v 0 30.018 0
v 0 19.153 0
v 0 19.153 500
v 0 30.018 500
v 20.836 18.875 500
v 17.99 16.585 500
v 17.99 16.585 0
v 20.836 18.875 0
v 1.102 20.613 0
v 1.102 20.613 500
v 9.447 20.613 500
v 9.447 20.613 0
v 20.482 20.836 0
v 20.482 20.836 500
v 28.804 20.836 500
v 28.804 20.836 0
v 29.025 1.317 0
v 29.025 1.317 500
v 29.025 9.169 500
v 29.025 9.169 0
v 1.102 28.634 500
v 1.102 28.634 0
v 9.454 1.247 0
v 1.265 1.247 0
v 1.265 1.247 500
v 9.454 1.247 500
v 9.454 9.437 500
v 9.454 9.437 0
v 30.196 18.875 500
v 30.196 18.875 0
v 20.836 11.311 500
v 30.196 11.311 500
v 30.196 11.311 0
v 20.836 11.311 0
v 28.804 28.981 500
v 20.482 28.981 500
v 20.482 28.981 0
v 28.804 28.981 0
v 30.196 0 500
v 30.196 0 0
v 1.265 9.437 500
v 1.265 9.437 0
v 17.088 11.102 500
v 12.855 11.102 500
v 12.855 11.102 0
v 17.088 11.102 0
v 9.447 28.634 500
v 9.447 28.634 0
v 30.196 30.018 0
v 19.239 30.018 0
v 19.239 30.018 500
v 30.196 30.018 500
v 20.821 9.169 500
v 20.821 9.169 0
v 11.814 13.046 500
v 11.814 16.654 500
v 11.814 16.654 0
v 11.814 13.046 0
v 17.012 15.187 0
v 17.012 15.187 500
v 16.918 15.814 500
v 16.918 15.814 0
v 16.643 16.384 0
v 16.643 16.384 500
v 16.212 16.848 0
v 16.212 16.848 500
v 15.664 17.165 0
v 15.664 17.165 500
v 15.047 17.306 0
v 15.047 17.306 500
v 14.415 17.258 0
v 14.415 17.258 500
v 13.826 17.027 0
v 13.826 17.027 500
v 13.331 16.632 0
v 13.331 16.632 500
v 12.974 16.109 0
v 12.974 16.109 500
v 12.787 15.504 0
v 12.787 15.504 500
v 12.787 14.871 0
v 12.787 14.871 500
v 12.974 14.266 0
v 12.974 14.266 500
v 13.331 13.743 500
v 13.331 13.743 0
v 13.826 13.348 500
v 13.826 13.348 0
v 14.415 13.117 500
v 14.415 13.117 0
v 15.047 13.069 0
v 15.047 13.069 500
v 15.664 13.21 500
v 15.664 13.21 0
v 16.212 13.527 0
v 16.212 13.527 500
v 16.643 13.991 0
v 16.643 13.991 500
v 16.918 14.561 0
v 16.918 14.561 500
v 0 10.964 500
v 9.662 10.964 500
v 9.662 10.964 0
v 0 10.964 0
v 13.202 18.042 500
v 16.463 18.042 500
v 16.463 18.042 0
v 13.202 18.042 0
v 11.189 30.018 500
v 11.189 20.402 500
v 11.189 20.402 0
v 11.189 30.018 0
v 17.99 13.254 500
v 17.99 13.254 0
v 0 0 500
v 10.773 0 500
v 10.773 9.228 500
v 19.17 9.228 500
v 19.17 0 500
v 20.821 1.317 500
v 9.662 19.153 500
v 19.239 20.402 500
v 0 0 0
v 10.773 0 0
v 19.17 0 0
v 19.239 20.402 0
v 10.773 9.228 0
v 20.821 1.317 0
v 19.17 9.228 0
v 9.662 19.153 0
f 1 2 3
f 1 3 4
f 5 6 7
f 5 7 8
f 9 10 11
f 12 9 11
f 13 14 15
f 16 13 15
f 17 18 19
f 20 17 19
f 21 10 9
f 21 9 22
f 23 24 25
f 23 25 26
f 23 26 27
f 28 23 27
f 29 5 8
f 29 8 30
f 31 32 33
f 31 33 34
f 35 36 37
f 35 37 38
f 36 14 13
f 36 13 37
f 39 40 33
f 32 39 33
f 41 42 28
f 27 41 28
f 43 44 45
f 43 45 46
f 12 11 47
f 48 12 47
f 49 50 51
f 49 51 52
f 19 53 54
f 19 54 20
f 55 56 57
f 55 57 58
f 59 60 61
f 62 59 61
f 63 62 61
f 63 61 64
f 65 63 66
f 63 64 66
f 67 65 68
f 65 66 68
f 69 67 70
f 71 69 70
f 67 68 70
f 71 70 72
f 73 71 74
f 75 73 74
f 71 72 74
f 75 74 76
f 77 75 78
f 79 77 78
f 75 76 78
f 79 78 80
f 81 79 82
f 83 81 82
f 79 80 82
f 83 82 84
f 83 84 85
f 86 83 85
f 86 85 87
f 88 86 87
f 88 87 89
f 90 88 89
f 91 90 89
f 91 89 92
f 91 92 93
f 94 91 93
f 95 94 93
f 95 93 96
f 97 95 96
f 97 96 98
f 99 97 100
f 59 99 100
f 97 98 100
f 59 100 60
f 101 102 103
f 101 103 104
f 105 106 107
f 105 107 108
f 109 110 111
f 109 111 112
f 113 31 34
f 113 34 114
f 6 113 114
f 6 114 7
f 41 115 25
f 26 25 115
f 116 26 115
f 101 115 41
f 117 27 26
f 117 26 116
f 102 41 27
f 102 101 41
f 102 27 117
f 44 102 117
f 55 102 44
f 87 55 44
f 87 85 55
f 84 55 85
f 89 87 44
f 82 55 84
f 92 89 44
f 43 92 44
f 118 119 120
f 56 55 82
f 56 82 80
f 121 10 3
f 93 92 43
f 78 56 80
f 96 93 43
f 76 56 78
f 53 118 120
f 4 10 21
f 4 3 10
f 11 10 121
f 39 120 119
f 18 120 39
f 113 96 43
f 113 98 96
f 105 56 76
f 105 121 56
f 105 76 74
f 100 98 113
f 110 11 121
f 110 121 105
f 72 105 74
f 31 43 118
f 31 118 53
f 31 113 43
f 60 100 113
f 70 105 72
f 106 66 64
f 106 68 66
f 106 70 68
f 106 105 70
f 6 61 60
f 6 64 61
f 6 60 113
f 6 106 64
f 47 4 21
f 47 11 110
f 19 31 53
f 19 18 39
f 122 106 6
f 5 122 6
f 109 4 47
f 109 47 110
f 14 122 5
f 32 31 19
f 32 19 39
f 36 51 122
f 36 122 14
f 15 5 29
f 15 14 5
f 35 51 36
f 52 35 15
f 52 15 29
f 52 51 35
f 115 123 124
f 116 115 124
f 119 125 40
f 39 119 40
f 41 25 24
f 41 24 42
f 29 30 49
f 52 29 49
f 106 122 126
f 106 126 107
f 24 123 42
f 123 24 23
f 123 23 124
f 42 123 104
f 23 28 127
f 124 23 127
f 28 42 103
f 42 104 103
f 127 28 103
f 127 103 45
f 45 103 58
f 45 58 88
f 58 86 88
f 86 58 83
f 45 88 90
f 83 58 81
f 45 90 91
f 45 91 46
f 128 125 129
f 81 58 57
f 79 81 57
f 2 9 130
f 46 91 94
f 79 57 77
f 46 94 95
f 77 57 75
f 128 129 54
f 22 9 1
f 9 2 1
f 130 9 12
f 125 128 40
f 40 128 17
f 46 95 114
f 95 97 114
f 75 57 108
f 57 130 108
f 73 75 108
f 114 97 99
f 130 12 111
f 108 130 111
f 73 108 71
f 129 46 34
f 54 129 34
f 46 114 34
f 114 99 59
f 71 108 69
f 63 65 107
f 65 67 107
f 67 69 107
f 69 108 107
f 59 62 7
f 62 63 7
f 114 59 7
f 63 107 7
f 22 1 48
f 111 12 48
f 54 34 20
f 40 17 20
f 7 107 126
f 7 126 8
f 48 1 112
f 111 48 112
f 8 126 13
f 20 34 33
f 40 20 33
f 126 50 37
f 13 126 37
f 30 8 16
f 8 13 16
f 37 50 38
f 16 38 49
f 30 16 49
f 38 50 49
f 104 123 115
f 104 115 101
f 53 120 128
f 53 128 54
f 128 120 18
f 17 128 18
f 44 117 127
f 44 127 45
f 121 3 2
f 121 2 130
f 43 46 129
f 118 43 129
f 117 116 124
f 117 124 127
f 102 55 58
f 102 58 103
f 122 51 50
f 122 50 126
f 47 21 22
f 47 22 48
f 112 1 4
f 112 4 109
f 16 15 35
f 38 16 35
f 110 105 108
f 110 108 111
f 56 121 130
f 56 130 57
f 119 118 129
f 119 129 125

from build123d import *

# Parameters (mm, degrees)
SKETCH_W      = 30.196043
SKETCH_H      = 30.018427
PAD_DEPTH     = 500
SKETCH001_R   = 2.124228
SKETCH001_W   = 8.189246
SKETCH001_H   = 8.189245
SKETCH001_W_2 = 8.203447
SKETCH001_H_2 = 7.852266
SKETCH001_W_3 = 8.321901
SKETCH001_H_3 = 8.144941
SKETCH001_W_4 = 8.345211
SKETCH001_H_4 = 8.02151
POCKET_DEPTH  = 500


with BuildPart() as part:
    # Sketch → Pad (new body)
    with BuildSketch(Plane.XY):
        with Locations((15.098021, 15.009213)):
            Rectangle(SKETCH_W, SKETCH_H)
    extrude(amount=PAD_DEPTH)

    # Sketch001 → Pocket (cut)
    with BuildSketch(Plane.XY.offset(500)):
        with Locations((14.887853, 15.18749)):
            Circle(SKETCH001_R)
        with Locations((5.35938, 5.342074)):
            Rectangle(SKETCH001_W, SKETCH001_H)
        with Locations((24.923182, 5.242986)):
            Rectangle(SKETCH001_W_2, SKETCH001_H_2)
        with Locations((24.643347, 24.908541)):
            Rectangle(SKETCH001_W_3, SKETCH001_H_3)
        with Locations((5.274876, 24.623256)):
            Rectangle(SKETCH001_W_4, SKETCH001_H_4)
        Polygon((19.170053, 9.228496), (19.170053, -1.667364), (10.77261, -1.667364), (10.77261, 9.228496), (12.854619, 11.102304), (17.088041, 11.102304), align=None)
        Polygon((32.078522, 11.310507), (20.835663, 11.310507), (17.990246, 13.253717), (17.990246, 16.584934), (20.835663, 18.875151), (32.078522, 18.875151), align=None)
        Polygon((11.189011, 31.922419), (19.239456, 31.922419), (19.239456, 20.401957), (16.46344, 18.042343), (13.20162, 18.042343), (11.189011, 20.401957), align=None)
        Polygon((-4.773074, 19.15275), (9.6622, 19.15275), (11.813614, 16.654335), (11.813614, 13.045515), (9.6622, 10.963505), (-4.773074, 10.963505), align=None)
    extrude(amount=-POCKET_DEPTH, mode=Mode.SUBTRACT)


solid = part.part
